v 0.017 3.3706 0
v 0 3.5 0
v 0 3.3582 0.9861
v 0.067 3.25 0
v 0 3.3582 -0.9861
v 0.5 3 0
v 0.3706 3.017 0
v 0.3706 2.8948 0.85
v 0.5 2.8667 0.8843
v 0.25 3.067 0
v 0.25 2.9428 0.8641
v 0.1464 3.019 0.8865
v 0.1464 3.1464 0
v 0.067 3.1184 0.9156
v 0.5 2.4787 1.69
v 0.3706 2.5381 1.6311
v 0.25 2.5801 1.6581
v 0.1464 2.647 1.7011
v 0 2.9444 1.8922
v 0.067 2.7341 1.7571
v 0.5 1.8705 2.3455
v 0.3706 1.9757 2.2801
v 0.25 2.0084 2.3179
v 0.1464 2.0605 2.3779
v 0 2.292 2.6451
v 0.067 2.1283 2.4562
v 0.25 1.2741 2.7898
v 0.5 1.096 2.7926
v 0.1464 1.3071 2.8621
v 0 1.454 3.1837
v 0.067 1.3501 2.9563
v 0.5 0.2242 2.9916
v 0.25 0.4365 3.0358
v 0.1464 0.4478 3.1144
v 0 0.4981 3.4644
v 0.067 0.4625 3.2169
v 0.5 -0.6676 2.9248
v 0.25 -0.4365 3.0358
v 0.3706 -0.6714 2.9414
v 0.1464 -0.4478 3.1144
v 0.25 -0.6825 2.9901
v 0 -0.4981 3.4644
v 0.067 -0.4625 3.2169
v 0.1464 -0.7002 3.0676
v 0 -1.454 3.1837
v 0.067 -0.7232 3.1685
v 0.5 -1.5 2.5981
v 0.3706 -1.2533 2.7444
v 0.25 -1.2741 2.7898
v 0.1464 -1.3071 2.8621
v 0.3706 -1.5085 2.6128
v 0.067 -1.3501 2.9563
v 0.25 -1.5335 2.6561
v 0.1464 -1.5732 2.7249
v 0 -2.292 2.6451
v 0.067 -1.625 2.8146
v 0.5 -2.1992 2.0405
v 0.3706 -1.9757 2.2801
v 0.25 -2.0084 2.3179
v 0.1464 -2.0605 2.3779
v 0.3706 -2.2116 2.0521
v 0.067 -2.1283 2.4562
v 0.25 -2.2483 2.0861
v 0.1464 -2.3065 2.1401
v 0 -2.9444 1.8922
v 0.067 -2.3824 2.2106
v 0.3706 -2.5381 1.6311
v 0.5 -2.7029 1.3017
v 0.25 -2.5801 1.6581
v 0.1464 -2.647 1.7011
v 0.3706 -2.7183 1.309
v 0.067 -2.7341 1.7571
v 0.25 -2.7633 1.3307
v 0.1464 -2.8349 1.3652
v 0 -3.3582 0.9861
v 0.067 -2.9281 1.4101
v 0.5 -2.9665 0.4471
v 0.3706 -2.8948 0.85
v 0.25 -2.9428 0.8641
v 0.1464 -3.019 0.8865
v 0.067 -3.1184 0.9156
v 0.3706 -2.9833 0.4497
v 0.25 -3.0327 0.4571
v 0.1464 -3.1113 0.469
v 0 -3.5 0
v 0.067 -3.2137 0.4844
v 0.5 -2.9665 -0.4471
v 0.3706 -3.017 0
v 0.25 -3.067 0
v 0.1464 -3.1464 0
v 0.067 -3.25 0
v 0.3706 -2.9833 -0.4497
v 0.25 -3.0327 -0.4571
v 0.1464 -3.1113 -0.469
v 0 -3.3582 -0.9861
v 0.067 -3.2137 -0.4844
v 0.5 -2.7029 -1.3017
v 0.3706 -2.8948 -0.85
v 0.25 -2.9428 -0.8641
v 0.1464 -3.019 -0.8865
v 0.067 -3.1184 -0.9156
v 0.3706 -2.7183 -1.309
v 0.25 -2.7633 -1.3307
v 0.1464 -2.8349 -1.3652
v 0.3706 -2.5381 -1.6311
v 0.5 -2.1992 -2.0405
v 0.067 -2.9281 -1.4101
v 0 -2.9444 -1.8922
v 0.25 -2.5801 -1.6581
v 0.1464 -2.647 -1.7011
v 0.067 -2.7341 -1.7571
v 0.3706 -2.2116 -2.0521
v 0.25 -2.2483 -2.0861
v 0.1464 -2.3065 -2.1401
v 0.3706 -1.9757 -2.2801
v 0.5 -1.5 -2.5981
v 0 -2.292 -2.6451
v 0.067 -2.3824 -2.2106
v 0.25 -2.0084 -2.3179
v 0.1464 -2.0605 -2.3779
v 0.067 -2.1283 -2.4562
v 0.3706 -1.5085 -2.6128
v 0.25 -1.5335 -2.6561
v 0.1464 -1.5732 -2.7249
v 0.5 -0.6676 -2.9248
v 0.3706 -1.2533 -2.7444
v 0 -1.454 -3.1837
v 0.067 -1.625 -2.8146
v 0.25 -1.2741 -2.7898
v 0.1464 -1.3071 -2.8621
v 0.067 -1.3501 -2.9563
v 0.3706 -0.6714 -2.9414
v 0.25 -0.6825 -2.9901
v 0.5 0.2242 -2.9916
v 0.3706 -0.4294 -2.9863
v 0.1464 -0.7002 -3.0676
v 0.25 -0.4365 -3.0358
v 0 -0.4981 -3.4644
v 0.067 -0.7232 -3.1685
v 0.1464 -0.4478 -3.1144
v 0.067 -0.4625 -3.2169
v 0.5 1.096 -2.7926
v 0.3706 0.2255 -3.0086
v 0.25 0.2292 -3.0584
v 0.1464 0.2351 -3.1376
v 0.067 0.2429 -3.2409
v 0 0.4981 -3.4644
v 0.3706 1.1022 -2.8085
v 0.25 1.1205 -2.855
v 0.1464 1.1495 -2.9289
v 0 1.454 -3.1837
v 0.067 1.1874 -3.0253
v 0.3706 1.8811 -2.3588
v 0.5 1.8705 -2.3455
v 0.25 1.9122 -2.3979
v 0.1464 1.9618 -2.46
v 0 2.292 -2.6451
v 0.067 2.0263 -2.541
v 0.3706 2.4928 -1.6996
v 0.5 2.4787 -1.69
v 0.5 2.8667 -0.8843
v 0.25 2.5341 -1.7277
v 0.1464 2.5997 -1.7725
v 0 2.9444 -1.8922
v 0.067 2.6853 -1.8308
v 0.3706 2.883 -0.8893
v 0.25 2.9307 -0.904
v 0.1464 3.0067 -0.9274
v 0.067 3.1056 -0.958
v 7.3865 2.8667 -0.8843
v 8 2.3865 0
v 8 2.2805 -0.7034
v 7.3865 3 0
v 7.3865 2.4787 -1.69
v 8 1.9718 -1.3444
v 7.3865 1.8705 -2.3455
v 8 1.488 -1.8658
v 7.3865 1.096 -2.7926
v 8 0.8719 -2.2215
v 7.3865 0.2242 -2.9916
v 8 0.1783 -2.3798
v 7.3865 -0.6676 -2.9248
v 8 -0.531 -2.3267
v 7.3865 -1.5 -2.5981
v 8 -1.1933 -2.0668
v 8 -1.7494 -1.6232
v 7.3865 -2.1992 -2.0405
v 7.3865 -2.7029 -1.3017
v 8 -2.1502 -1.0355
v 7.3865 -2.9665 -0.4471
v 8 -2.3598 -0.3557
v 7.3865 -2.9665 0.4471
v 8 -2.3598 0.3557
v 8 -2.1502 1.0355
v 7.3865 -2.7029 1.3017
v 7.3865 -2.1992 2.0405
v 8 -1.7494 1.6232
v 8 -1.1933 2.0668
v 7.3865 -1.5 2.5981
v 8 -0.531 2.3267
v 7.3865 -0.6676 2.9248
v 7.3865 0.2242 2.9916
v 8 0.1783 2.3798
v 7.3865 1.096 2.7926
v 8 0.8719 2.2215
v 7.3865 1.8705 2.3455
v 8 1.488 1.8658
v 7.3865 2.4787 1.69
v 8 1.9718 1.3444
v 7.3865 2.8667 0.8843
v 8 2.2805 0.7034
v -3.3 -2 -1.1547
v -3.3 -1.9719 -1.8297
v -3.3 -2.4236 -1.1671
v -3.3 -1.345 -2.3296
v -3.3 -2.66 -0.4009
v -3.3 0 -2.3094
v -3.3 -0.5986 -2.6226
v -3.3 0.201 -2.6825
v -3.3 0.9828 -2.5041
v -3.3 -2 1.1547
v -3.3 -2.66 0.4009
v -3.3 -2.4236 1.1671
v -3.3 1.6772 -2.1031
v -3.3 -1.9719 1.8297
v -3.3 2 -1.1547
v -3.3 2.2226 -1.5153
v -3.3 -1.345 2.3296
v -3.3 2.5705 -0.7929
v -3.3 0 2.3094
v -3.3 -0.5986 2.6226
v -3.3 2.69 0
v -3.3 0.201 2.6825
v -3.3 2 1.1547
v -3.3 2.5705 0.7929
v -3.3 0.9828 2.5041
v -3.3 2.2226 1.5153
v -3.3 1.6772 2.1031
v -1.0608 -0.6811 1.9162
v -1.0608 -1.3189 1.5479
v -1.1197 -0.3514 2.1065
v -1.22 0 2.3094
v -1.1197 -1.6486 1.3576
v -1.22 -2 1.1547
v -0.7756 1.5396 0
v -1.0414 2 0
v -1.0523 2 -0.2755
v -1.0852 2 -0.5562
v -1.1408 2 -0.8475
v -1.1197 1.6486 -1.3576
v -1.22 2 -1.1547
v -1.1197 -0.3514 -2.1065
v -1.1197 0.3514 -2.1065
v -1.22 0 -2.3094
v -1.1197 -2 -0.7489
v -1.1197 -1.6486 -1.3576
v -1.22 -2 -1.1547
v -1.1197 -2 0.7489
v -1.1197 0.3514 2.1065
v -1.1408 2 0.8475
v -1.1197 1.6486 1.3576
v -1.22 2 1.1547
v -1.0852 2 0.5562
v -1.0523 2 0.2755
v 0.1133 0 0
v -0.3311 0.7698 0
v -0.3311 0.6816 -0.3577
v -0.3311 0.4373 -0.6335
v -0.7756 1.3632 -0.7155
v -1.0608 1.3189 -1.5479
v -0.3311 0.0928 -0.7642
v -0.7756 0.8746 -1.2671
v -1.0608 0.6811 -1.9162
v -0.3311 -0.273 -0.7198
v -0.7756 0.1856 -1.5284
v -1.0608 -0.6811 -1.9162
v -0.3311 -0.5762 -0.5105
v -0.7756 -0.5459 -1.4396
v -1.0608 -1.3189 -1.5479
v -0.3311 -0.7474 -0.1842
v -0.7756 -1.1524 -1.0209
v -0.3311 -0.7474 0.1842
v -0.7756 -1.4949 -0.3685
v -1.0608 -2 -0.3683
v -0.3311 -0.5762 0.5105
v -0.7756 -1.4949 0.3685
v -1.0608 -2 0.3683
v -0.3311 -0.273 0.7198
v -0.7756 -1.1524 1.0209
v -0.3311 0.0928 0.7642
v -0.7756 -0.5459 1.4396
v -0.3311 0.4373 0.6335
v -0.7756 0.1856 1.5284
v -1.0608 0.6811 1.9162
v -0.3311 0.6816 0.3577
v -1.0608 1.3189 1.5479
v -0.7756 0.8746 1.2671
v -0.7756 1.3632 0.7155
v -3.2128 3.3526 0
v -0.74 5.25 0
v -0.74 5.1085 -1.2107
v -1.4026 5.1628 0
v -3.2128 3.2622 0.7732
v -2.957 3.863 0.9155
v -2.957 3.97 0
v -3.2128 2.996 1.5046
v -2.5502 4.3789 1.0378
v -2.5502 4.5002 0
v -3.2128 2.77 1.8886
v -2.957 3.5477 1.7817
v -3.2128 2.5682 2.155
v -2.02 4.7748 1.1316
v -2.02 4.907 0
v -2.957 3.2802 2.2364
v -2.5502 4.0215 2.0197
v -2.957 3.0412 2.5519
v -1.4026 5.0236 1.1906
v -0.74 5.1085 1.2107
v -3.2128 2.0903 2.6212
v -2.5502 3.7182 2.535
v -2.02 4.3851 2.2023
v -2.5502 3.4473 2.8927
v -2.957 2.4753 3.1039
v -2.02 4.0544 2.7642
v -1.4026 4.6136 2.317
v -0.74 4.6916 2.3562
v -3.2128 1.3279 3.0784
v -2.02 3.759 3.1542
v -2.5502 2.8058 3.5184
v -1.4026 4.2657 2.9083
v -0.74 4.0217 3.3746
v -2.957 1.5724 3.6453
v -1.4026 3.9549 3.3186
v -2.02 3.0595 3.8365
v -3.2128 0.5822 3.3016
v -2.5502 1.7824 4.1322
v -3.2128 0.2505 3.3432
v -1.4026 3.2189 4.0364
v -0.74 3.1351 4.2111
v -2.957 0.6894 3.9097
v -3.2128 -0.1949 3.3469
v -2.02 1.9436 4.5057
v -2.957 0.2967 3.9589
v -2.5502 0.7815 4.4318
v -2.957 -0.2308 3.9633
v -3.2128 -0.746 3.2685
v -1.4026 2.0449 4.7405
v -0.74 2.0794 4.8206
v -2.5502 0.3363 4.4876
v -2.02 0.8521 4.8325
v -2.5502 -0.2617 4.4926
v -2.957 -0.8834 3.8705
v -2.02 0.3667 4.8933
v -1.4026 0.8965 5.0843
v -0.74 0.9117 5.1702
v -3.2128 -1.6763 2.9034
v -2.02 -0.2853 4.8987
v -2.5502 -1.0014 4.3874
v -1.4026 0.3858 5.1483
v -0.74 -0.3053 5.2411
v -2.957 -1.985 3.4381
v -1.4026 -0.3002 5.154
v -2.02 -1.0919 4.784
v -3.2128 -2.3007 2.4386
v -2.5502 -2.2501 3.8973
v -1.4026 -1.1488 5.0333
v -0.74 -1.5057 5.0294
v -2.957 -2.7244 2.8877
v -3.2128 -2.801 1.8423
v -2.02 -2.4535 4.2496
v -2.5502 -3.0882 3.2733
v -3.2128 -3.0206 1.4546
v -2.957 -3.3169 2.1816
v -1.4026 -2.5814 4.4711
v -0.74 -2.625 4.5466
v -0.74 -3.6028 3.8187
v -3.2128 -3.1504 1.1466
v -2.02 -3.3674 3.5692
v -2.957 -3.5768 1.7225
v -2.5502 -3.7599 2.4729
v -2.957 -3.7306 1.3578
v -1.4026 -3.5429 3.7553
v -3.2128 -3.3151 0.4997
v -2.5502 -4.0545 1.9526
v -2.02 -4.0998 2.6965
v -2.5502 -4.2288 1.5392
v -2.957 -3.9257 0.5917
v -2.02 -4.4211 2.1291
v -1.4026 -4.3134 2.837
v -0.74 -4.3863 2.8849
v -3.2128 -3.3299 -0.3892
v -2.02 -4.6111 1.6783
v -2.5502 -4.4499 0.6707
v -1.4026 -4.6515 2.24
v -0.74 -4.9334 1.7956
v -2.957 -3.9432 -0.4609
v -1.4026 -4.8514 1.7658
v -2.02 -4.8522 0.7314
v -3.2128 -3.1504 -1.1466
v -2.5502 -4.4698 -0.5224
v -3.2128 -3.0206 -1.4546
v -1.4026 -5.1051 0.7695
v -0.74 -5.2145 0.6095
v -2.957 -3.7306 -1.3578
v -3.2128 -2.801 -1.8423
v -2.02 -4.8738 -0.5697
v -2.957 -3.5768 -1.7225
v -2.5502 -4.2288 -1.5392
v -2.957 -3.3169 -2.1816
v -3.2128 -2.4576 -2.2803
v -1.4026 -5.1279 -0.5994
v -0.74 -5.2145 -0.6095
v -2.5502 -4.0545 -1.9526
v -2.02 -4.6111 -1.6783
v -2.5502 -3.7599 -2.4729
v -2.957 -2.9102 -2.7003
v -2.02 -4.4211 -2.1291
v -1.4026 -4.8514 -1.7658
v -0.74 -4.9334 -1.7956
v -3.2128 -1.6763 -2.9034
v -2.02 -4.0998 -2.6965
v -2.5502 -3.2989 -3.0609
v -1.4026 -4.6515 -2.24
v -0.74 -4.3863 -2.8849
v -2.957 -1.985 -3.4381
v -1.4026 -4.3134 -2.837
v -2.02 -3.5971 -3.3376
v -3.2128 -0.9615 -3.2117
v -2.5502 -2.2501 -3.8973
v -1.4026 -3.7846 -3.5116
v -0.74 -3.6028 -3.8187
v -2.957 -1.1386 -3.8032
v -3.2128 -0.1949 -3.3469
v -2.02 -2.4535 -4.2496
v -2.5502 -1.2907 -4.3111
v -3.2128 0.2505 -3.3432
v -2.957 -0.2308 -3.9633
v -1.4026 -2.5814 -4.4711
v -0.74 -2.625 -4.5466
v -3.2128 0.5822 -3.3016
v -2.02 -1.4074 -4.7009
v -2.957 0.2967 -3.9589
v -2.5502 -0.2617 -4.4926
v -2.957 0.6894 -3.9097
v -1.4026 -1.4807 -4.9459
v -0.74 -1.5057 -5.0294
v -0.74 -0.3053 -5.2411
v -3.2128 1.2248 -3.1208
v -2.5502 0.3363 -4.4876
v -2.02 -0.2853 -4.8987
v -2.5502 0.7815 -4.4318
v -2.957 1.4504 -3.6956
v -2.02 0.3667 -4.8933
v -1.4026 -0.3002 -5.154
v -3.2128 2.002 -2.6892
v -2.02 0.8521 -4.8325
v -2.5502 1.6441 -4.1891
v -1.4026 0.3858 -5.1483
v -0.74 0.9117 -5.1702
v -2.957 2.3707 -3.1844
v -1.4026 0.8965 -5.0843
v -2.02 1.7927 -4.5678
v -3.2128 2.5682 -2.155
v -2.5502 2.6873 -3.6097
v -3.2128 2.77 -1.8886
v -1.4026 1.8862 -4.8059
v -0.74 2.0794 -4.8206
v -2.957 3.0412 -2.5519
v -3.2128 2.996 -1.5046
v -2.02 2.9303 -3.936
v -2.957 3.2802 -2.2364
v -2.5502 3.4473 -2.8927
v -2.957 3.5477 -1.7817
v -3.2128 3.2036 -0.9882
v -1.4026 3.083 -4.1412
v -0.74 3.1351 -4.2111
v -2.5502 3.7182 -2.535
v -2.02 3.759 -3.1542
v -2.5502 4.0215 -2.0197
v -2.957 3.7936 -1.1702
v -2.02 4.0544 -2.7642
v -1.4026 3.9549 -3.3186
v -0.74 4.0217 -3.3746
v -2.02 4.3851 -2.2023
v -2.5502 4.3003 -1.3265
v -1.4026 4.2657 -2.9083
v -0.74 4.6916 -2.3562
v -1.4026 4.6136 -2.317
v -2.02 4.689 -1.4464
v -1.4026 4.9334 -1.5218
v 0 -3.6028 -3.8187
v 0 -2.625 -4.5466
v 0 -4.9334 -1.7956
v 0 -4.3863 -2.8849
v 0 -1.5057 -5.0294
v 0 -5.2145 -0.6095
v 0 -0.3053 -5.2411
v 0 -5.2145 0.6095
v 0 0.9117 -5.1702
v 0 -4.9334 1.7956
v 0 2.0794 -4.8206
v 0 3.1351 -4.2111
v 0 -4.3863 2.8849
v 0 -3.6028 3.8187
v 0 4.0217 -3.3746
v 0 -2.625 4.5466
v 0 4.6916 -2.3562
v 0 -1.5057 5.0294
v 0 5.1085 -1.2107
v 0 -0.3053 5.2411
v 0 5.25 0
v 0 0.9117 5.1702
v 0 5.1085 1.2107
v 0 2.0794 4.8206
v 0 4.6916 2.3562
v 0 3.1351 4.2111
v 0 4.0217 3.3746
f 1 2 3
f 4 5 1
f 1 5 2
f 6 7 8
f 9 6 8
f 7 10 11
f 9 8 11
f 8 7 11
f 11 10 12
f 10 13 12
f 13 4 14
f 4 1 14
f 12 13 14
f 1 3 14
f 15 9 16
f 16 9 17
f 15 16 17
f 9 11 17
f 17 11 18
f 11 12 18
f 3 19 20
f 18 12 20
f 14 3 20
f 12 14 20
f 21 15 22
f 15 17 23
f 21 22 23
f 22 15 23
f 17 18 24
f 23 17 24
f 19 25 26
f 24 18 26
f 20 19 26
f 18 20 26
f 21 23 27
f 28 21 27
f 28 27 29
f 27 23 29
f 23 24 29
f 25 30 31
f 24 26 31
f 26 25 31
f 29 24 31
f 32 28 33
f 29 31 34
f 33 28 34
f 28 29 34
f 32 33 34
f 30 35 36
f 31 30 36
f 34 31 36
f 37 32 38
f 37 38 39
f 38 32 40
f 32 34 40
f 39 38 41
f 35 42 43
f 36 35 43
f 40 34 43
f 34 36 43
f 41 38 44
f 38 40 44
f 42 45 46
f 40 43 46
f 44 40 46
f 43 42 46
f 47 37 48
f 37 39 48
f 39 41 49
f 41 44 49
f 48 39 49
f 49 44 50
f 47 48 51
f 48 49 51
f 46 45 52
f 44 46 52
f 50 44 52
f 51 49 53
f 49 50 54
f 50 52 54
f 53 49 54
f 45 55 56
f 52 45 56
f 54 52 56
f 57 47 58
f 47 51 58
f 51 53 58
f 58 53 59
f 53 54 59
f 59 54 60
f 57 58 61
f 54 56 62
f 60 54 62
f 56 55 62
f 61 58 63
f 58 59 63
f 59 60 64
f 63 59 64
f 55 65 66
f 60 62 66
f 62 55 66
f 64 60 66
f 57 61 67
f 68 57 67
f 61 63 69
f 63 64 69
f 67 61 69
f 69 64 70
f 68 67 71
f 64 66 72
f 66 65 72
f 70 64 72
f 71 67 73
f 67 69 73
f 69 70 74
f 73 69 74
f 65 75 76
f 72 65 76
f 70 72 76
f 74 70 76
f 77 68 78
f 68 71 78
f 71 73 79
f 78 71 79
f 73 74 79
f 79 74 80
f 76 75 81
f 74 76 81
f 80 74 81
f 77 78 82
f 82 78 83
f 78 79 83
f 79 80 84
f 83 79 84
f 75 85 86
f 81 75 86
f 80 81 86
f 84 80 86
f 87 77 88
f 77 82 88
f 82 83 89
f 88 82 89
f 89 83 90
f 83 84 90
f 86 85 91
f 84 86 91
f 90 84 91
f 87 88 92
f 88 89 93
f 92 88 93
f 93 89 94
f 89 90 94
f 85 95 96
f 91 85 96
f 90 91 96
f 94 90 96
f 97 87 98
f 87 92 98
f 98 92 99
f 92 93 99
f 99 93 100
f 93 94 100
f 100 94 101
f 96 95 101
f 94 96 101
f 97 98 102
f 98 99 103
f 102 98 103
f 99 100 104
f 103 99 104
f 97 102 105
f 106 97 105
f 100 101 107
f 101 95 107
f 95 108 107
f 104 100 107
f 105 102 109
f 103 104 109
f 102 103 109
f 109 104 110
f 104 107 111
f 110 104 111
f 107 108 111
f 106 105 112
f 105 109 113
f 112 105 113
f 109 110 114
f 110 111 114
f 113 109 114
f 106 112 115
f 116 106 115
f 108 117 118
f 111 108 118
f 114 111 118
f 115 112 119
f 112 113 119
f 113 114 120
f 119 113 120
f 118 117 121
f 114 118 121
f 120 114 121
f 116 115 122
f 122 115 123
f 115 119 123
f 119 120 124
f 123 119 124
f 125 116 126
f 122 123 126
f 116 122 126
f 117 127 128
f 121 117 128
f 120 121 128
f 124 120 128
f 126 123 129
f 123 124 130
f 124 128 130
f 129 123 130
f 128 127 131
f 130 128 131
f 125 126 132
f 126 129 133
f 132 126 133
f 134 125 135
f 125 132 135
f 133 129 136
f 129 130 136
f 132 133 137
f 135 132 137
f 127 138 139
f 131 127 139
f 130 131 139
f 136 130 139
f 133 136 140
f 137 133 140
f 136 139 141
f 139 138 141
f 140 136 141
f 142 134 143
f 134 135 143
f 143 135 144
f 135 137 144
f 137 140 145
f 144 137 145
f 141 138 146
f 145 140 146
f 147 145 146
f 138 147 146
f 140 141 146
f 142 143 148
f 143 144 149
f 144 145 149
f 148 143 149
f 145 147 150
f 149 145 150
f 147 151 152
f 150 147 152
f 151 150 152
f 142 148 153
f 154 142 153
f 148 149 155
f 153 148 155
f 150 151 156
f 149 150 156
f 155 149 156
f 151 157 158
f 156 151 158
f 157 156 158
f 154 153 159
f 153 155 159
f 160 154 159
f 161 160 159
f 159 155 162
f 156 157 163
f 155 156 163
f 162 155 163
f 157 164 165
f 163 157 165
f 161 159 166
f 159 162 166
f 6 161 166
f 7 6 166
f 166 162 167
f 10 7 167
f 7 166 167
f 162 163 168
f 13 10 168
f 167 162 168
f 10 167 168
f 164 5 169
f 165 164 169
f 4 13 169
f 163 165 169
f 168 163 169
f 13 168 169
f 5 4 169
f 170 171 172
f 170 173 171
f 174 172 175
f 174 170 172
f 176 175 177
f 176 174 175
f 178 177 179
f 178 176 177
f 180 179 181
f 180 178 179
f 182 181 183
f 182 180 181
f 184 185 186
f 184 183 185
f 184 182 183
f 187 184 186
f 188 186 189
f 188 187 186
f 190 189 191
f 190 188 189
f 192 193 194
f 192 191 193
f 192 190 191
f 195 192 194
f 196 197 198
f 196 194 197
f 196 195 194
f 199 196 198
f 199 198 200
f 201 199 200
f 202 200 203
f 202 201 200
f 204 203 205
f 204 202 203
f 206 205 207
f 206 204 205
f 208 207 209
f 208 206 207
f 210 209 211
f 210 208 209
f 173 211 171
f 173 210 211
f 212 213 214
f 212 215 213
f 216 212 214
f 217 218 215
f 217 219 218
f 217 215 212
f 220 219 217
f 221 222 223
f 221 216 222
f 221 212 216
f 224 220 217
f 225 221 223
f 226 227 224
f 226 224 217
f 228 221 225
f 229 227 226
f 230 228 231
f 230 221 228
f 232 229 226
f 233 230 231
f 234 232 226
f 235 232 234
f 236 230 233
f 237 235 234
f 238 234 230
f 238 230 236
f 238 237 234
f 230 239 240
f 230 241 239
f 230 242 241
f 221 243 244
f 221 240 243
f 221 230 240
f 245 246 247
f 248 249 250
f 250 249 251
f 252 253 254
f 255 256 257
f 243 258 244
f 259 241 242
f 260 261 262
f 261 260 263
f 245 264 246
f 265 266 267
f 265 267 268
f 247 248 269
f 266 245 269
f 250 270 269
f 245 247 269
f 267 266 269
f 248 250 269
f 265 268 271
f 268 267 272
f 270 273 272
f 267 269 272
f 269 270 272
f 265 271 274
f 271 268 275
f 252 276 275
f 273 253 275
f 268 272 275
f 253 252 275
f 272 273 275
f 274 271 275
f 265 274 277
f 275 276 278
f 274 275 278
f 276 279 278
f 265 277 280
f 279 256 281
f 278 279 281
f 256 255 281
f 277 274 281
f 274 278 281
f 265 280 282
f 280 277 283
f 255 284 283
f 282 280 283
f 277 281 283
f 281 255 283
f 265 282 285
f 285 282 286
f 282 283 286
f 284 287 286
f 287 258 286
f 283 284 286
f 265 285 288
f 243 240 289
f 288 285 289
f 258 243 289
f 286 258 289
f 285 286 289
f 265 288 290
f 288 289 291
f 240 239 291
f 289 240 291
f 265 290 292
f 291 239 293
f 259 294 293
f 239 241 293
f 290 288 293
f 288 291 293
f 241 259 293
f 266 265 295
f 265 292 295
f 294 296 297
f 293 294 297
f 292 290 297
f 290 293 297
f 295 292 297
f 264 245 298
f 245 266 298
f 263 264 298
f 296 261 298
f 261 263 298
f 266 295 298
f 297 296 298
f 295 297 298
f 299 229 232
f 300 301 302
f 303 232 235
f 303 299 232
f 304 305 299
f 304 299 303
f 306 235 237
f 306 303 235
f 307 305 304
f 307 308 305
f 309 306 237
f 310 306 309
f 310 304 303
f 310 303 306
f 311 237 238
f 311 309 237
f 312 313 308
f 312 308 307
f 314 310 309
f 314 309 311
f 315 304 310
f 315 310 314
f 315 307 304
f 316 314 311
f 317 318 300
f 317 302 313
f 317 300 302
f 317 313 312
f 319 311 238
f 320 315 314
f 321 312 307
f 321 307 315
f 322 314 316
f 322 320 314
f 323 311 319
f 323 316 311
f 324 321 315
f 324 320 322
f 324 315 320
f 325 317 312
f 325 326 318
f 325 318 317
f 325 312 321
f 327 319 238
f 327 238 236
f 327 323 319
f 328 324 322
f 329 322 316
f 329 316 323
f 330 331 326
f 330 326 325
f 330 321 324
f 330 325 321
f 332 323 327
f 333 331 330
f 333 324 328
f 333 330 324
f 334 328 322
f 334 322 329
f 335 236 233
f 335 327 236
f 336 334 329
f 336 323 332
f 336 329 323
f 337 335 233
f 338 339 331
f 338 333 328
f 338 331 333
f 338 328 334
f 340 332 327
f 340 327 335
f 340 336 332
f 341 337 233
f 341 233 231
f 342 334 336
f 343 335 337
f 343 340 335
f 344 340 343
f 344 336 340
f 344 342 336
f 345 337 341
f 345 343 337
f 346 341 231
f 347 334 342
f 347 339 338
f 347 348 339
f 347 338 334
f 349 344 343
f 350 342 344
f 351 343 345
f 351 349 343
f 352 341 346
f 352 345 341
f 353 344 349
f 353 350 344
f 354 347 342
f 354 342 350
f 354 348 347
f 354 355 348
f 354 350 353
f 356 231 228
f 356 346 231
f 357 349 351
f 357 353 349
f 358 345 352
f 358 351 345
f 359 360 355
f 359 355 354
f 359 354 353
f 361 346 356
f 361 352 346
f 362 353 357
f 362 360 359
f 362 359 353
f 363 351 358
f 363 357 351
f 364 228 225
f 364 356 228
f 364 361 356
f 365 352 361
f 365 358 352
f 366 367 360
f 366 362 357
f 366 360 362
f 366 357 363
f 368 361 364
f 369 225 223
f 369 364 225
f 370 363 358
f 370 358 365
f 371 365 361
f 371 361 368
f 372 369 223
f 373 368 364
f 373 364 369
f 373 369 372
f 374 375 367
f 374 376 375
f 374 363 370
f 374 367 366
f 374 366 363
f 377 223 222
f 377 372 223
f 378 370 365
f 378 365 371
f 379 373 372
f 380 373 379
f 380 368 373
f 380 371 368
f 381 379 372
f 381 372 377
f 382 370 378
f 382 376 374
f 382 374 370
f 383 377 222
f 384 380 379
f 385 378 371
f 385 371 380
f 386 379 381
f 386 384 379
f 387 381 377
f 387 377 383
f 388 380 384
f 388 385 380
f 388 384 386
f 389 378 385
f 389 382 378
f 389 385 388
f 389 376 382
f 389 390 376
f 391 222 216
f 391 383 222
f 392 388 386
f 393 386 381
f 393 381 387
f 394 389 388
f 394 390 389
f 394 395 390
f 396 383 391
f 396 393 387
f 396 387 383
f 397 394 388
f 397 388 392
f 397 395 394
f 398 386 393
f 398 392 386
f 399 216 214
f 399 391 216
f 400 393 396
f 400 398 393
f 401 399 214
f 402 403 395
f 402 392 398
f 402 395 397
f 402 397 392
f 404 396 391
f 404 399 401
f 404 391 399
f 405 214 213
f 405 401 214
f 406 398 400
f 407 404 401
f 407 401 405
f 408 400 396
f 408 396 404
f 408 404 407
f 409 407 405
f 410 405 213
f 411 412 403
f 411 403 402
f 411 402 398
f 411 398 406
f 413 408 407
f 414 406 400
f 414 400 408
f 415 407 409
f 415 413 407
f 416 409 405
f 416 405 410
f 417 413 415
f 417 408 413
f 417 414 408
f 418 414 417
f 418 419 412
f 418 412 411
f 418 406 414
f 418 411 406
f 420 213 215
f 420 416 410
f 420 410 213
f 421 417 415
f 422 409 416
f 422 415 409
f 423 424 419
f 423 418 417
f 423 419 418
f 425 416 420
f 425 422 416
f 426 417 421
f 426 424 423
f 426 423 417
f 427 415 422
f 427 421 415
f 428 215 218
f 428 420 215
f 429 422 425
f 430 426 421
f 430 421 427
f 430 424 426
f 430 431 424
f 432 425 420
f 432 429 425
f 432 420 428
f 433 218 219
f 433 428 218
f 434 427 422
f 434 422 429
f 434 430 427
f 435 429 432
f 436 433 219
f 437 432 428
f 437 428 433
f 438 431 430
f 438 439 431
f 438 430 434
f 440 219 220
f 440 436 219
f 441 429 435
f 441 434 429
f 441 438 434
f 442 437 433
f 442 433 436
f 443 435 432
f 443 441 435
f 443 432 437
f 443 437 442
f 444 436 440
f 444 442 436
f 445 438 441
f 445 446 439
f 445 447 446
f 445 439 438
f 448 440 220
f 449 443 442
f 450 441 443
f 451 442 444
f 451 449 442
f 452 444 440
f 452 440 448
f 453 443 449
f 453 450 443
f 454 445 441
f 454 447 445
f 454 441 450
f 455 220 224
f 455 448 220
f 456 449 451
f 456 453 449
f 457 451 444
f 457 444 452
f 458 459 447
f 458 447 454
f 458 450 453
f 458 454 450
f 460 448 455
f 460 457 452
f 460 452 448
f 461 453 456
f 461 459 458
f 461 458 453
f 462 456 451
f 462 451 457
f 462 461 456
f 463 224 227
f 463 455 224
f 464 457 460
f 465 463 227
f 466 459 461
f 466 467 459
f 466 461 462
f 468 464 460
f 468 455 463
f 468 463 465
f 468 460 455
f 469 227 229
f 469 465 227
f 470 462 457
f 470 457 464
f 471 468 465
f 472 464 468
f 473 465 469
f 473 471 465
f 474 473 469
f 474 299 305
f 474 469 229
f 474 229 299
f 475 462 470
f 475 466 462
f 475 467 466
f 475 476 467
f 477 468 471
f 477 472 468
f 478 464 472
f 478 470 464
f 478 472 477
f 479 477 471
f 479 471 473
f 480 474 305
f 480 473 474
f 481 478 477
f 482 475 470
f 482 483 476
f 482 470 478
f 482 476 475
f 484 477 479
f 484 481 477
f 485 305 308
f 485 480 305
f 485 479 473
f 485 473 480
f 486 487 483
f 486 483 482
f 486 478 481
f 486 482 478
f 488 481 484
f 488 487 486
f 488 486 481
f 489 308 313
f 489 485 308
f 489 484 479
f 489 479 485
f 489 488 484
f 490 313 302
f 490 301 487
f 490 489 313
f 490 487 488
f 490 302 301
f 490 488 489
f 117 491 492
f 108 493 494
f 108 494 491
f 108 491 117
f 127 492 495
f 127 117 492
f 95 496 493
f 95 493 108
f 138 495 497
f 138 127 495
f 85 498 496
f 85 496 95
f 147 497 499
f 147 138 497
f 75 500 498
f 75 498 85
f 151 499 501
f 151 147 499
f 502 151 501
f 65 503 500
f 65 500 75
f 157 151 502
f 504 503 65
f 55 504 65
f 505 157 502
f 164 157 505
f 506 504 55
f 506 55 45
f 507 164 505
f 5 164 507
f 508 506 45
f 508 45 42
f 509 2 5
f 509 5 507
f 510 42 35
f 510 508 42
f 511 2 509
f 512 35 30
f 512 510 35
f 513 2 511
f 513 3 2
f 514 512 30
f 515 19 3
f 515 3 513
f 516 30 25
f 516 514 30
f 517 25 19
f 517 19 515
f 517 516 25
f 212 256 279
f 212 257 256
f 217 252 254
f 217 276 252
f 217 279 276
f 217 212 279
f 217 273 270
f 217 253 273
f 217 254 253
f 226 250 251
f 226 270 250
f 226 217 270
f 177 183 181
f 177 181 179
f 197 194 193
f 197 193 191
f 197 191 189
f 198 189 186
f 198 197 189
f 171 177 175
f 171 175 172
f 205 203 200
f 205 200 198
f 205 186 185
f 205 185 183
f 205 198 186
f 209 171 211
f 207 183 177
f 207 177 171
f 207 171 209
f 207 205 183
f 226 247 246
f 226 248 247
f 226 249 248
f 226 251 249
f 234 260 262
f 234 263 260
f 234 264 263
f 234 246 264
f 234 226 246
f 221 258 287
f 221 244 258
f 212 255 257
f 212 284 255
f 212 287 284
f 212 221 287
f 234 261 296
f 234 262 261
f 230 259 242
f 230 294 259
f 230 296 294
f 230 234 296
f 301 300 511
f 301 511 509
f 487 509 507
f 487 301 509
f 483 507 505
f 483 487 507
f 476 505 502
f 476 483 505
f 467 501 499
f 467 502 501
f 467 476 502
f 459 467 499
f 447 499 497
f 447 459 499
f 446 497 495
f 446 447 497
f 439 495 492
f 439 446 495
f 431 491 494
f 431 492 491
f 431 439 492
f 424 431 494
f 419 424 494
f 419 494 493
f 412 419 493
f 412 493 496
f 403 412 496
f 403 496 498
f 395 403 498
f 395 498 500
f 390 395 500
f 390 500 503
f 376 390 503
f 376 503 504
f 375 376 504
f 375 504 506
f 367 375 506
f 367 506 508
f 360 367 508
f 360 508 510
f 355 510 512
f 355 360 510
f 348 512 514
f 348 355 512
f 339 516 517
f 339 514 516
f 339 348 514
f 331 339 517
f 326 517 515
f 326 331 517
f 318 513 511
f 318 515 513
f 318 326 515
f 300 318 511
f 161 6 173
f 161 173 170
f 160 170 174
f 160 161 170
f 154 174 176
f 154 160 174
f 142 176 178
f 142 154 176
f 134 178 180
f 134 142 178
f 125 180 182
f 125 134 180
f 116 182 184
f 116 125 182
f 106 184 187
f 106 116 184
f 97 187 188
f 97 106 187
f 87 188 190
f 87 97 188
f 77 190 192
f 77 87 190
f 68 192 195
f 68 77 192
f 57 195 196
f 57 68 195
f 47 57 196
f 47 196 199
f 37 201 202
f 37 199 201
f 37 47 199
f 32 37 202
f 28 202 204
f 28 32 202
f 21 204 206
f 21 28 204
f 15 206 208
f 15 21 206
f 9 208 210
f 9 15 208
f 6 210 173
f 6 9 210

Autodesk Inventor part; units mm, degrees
ref_plane "YZ Plane" through (0, 0, 0) normal (1, 0, 0) x (0, 1, 0)
ref_plane "XZ Plane" through (0, 0, 0) normal (0, 1, 0) x (-1, 0, 0)
sketch "Sketch1" plane through (0, 0, 0) normal (0, 0, 1) x (1, 0, 0)
  line L0 (0.1133, 0) -> (8, 0)
  line L1 (8, 0) -> (8, 3)
  line L2 (8, 3) -> (1, 3)
  line L3 (1, 3) -> (0.3865, 3)
  line L4 (0.3865, 3) -> (0, 3)
  line L5 (0, 3) -> (0, 5.25)
  line L6 (0, 5.25) -> (-3.3, 5.25)
  line L7 (-3.3, 5.25) -> (-3.3, 2.3094)
  line L8 (-3.3, 2.3094) -> (-1.22, 2.3094)
  line L9 (-1.22, 2.3094) -> (0.1133, 0)
  line L10 (-5.56, 0) -> (10.26, 0) projected
  line L11 (0, -1.05) -> (0, 6.3) projected
  line L12 (1, 3) -> (0, 3) construction
  dimension "d1" = 7
  dimension "d2" = 0.6136
  dimension "d3" = 3.3
  dimension "d4" = 2.08
  dimension "d5" = 60
  dimension "d6" = 6
  dimension "d7" = 6
  dimension "d8" = 4.6188
  dimension "d9" = 10.5
  dimension "d26" = 8
revolve "Body" add sketch "Sketch1" angle 360 about axis through (0.1133, 0, 0) along (1, 0, 0) contours L9 L11 L4 L3 L2 L1 L0 | L9 L8 L7 L6 L5 L11
sketch "Sketch2" plane through (-3.3, 0, 0) normal (-1, 0, 0) x (0, 0, 1)
  circle A0 centre (0, 0) radius 2.3094 projected
  line L0 (0, -7.35) -> (0, 7.35) projected
  line L1 (-7.35, 0) -> (7.35, 0) projected
  line L2 (2.3094, 0) -> (1.1547, -2)
  line L3 (1.1547, -2) -> (-1.1547, -2)
  line L4 (-1.1547, -2) -> (-2.3094, 0)
  line L5 (-2.3094, 0) -> (-1.1547, 2)
  line L6 (-1.1547, 2) -> (1.1547, 2)
  line L7 (1.1547, 2) -> (2.3094, 0)
extrude "Slot" add sketch "Sketch2" against normal up to next contours L7 A0 | A0 L2 | L6 L0 A0 | A0 L0 L3 | L0 L6 A0 | A0 L3 L0 | L4 A0 | A0 L5
fillet "Fillet1" radius 2.56 1 edges at (-3.3, -5.25, 0)
thread "Thread" size "M6x1" class "6g" standard "ISO Metric profile" length 7
chamfer "Chamfer1" distance 0.6135 distance2 0.6135 1 edges at (8, -3, 0) measured on face at (8, 0.705, 0.3049)
ref_plane "Work Plane1" through (29, 0, 0) normal (0, -1, 0) x (1, 0, 0)
fillet "Fillet2" radius 0.5 1 edges at (0, -3, 0)
equation "\"d30\" = R"
equation "\"d17\" = RR"
equation "\"d13\" = GEL"
equation "\"d15\" = -0.5 * SPD + 0.5 * GD"
equation "\"d16\" = GUL"
equation "\"d1\" = GEL"
equation "\"d3\" = KOH"
equation "\"d4\" = INTI"
equation "\"d6\" = GD"
equation "\"d7\" = BDM"
equation "\"d8\" = 1.1547 * SW"
equation "\"d9\" = KOD"
equation "\"GD\" = NND"
equation "\"GEL\" = 7"
equation "\"KOD\" = 10.5"
equation "\"KOH\" = 3.3"
equation "\"INTI\" = 2.08"
equation "\"GAL\" = 0.61345 * PTC"
equation "\"GUL\" = 0.61345 * PTC"
equation "\"BDM\" = NND"
equation "\"SW\" = 4"
equation "\"RR\" = 2.56"
equation "\"SPD\" = NND - 1.2269 * PTC"
equation "\"R\" = 0.5"
equation "\"TOA\" = 30deg"
equation "\"GD1\" = THREADDIA - 1.2269 * PTC"
equation "\"THREADDIA\" = 6"
equation "\"PTC\" = 1"
equation "\"NND\" = 6"
equation "\"KOH1\" = 0.74"
equation "\"E0\" = 4.583"
properties part number "ISO 7380-1 - M6 x 10" material "Steel"
